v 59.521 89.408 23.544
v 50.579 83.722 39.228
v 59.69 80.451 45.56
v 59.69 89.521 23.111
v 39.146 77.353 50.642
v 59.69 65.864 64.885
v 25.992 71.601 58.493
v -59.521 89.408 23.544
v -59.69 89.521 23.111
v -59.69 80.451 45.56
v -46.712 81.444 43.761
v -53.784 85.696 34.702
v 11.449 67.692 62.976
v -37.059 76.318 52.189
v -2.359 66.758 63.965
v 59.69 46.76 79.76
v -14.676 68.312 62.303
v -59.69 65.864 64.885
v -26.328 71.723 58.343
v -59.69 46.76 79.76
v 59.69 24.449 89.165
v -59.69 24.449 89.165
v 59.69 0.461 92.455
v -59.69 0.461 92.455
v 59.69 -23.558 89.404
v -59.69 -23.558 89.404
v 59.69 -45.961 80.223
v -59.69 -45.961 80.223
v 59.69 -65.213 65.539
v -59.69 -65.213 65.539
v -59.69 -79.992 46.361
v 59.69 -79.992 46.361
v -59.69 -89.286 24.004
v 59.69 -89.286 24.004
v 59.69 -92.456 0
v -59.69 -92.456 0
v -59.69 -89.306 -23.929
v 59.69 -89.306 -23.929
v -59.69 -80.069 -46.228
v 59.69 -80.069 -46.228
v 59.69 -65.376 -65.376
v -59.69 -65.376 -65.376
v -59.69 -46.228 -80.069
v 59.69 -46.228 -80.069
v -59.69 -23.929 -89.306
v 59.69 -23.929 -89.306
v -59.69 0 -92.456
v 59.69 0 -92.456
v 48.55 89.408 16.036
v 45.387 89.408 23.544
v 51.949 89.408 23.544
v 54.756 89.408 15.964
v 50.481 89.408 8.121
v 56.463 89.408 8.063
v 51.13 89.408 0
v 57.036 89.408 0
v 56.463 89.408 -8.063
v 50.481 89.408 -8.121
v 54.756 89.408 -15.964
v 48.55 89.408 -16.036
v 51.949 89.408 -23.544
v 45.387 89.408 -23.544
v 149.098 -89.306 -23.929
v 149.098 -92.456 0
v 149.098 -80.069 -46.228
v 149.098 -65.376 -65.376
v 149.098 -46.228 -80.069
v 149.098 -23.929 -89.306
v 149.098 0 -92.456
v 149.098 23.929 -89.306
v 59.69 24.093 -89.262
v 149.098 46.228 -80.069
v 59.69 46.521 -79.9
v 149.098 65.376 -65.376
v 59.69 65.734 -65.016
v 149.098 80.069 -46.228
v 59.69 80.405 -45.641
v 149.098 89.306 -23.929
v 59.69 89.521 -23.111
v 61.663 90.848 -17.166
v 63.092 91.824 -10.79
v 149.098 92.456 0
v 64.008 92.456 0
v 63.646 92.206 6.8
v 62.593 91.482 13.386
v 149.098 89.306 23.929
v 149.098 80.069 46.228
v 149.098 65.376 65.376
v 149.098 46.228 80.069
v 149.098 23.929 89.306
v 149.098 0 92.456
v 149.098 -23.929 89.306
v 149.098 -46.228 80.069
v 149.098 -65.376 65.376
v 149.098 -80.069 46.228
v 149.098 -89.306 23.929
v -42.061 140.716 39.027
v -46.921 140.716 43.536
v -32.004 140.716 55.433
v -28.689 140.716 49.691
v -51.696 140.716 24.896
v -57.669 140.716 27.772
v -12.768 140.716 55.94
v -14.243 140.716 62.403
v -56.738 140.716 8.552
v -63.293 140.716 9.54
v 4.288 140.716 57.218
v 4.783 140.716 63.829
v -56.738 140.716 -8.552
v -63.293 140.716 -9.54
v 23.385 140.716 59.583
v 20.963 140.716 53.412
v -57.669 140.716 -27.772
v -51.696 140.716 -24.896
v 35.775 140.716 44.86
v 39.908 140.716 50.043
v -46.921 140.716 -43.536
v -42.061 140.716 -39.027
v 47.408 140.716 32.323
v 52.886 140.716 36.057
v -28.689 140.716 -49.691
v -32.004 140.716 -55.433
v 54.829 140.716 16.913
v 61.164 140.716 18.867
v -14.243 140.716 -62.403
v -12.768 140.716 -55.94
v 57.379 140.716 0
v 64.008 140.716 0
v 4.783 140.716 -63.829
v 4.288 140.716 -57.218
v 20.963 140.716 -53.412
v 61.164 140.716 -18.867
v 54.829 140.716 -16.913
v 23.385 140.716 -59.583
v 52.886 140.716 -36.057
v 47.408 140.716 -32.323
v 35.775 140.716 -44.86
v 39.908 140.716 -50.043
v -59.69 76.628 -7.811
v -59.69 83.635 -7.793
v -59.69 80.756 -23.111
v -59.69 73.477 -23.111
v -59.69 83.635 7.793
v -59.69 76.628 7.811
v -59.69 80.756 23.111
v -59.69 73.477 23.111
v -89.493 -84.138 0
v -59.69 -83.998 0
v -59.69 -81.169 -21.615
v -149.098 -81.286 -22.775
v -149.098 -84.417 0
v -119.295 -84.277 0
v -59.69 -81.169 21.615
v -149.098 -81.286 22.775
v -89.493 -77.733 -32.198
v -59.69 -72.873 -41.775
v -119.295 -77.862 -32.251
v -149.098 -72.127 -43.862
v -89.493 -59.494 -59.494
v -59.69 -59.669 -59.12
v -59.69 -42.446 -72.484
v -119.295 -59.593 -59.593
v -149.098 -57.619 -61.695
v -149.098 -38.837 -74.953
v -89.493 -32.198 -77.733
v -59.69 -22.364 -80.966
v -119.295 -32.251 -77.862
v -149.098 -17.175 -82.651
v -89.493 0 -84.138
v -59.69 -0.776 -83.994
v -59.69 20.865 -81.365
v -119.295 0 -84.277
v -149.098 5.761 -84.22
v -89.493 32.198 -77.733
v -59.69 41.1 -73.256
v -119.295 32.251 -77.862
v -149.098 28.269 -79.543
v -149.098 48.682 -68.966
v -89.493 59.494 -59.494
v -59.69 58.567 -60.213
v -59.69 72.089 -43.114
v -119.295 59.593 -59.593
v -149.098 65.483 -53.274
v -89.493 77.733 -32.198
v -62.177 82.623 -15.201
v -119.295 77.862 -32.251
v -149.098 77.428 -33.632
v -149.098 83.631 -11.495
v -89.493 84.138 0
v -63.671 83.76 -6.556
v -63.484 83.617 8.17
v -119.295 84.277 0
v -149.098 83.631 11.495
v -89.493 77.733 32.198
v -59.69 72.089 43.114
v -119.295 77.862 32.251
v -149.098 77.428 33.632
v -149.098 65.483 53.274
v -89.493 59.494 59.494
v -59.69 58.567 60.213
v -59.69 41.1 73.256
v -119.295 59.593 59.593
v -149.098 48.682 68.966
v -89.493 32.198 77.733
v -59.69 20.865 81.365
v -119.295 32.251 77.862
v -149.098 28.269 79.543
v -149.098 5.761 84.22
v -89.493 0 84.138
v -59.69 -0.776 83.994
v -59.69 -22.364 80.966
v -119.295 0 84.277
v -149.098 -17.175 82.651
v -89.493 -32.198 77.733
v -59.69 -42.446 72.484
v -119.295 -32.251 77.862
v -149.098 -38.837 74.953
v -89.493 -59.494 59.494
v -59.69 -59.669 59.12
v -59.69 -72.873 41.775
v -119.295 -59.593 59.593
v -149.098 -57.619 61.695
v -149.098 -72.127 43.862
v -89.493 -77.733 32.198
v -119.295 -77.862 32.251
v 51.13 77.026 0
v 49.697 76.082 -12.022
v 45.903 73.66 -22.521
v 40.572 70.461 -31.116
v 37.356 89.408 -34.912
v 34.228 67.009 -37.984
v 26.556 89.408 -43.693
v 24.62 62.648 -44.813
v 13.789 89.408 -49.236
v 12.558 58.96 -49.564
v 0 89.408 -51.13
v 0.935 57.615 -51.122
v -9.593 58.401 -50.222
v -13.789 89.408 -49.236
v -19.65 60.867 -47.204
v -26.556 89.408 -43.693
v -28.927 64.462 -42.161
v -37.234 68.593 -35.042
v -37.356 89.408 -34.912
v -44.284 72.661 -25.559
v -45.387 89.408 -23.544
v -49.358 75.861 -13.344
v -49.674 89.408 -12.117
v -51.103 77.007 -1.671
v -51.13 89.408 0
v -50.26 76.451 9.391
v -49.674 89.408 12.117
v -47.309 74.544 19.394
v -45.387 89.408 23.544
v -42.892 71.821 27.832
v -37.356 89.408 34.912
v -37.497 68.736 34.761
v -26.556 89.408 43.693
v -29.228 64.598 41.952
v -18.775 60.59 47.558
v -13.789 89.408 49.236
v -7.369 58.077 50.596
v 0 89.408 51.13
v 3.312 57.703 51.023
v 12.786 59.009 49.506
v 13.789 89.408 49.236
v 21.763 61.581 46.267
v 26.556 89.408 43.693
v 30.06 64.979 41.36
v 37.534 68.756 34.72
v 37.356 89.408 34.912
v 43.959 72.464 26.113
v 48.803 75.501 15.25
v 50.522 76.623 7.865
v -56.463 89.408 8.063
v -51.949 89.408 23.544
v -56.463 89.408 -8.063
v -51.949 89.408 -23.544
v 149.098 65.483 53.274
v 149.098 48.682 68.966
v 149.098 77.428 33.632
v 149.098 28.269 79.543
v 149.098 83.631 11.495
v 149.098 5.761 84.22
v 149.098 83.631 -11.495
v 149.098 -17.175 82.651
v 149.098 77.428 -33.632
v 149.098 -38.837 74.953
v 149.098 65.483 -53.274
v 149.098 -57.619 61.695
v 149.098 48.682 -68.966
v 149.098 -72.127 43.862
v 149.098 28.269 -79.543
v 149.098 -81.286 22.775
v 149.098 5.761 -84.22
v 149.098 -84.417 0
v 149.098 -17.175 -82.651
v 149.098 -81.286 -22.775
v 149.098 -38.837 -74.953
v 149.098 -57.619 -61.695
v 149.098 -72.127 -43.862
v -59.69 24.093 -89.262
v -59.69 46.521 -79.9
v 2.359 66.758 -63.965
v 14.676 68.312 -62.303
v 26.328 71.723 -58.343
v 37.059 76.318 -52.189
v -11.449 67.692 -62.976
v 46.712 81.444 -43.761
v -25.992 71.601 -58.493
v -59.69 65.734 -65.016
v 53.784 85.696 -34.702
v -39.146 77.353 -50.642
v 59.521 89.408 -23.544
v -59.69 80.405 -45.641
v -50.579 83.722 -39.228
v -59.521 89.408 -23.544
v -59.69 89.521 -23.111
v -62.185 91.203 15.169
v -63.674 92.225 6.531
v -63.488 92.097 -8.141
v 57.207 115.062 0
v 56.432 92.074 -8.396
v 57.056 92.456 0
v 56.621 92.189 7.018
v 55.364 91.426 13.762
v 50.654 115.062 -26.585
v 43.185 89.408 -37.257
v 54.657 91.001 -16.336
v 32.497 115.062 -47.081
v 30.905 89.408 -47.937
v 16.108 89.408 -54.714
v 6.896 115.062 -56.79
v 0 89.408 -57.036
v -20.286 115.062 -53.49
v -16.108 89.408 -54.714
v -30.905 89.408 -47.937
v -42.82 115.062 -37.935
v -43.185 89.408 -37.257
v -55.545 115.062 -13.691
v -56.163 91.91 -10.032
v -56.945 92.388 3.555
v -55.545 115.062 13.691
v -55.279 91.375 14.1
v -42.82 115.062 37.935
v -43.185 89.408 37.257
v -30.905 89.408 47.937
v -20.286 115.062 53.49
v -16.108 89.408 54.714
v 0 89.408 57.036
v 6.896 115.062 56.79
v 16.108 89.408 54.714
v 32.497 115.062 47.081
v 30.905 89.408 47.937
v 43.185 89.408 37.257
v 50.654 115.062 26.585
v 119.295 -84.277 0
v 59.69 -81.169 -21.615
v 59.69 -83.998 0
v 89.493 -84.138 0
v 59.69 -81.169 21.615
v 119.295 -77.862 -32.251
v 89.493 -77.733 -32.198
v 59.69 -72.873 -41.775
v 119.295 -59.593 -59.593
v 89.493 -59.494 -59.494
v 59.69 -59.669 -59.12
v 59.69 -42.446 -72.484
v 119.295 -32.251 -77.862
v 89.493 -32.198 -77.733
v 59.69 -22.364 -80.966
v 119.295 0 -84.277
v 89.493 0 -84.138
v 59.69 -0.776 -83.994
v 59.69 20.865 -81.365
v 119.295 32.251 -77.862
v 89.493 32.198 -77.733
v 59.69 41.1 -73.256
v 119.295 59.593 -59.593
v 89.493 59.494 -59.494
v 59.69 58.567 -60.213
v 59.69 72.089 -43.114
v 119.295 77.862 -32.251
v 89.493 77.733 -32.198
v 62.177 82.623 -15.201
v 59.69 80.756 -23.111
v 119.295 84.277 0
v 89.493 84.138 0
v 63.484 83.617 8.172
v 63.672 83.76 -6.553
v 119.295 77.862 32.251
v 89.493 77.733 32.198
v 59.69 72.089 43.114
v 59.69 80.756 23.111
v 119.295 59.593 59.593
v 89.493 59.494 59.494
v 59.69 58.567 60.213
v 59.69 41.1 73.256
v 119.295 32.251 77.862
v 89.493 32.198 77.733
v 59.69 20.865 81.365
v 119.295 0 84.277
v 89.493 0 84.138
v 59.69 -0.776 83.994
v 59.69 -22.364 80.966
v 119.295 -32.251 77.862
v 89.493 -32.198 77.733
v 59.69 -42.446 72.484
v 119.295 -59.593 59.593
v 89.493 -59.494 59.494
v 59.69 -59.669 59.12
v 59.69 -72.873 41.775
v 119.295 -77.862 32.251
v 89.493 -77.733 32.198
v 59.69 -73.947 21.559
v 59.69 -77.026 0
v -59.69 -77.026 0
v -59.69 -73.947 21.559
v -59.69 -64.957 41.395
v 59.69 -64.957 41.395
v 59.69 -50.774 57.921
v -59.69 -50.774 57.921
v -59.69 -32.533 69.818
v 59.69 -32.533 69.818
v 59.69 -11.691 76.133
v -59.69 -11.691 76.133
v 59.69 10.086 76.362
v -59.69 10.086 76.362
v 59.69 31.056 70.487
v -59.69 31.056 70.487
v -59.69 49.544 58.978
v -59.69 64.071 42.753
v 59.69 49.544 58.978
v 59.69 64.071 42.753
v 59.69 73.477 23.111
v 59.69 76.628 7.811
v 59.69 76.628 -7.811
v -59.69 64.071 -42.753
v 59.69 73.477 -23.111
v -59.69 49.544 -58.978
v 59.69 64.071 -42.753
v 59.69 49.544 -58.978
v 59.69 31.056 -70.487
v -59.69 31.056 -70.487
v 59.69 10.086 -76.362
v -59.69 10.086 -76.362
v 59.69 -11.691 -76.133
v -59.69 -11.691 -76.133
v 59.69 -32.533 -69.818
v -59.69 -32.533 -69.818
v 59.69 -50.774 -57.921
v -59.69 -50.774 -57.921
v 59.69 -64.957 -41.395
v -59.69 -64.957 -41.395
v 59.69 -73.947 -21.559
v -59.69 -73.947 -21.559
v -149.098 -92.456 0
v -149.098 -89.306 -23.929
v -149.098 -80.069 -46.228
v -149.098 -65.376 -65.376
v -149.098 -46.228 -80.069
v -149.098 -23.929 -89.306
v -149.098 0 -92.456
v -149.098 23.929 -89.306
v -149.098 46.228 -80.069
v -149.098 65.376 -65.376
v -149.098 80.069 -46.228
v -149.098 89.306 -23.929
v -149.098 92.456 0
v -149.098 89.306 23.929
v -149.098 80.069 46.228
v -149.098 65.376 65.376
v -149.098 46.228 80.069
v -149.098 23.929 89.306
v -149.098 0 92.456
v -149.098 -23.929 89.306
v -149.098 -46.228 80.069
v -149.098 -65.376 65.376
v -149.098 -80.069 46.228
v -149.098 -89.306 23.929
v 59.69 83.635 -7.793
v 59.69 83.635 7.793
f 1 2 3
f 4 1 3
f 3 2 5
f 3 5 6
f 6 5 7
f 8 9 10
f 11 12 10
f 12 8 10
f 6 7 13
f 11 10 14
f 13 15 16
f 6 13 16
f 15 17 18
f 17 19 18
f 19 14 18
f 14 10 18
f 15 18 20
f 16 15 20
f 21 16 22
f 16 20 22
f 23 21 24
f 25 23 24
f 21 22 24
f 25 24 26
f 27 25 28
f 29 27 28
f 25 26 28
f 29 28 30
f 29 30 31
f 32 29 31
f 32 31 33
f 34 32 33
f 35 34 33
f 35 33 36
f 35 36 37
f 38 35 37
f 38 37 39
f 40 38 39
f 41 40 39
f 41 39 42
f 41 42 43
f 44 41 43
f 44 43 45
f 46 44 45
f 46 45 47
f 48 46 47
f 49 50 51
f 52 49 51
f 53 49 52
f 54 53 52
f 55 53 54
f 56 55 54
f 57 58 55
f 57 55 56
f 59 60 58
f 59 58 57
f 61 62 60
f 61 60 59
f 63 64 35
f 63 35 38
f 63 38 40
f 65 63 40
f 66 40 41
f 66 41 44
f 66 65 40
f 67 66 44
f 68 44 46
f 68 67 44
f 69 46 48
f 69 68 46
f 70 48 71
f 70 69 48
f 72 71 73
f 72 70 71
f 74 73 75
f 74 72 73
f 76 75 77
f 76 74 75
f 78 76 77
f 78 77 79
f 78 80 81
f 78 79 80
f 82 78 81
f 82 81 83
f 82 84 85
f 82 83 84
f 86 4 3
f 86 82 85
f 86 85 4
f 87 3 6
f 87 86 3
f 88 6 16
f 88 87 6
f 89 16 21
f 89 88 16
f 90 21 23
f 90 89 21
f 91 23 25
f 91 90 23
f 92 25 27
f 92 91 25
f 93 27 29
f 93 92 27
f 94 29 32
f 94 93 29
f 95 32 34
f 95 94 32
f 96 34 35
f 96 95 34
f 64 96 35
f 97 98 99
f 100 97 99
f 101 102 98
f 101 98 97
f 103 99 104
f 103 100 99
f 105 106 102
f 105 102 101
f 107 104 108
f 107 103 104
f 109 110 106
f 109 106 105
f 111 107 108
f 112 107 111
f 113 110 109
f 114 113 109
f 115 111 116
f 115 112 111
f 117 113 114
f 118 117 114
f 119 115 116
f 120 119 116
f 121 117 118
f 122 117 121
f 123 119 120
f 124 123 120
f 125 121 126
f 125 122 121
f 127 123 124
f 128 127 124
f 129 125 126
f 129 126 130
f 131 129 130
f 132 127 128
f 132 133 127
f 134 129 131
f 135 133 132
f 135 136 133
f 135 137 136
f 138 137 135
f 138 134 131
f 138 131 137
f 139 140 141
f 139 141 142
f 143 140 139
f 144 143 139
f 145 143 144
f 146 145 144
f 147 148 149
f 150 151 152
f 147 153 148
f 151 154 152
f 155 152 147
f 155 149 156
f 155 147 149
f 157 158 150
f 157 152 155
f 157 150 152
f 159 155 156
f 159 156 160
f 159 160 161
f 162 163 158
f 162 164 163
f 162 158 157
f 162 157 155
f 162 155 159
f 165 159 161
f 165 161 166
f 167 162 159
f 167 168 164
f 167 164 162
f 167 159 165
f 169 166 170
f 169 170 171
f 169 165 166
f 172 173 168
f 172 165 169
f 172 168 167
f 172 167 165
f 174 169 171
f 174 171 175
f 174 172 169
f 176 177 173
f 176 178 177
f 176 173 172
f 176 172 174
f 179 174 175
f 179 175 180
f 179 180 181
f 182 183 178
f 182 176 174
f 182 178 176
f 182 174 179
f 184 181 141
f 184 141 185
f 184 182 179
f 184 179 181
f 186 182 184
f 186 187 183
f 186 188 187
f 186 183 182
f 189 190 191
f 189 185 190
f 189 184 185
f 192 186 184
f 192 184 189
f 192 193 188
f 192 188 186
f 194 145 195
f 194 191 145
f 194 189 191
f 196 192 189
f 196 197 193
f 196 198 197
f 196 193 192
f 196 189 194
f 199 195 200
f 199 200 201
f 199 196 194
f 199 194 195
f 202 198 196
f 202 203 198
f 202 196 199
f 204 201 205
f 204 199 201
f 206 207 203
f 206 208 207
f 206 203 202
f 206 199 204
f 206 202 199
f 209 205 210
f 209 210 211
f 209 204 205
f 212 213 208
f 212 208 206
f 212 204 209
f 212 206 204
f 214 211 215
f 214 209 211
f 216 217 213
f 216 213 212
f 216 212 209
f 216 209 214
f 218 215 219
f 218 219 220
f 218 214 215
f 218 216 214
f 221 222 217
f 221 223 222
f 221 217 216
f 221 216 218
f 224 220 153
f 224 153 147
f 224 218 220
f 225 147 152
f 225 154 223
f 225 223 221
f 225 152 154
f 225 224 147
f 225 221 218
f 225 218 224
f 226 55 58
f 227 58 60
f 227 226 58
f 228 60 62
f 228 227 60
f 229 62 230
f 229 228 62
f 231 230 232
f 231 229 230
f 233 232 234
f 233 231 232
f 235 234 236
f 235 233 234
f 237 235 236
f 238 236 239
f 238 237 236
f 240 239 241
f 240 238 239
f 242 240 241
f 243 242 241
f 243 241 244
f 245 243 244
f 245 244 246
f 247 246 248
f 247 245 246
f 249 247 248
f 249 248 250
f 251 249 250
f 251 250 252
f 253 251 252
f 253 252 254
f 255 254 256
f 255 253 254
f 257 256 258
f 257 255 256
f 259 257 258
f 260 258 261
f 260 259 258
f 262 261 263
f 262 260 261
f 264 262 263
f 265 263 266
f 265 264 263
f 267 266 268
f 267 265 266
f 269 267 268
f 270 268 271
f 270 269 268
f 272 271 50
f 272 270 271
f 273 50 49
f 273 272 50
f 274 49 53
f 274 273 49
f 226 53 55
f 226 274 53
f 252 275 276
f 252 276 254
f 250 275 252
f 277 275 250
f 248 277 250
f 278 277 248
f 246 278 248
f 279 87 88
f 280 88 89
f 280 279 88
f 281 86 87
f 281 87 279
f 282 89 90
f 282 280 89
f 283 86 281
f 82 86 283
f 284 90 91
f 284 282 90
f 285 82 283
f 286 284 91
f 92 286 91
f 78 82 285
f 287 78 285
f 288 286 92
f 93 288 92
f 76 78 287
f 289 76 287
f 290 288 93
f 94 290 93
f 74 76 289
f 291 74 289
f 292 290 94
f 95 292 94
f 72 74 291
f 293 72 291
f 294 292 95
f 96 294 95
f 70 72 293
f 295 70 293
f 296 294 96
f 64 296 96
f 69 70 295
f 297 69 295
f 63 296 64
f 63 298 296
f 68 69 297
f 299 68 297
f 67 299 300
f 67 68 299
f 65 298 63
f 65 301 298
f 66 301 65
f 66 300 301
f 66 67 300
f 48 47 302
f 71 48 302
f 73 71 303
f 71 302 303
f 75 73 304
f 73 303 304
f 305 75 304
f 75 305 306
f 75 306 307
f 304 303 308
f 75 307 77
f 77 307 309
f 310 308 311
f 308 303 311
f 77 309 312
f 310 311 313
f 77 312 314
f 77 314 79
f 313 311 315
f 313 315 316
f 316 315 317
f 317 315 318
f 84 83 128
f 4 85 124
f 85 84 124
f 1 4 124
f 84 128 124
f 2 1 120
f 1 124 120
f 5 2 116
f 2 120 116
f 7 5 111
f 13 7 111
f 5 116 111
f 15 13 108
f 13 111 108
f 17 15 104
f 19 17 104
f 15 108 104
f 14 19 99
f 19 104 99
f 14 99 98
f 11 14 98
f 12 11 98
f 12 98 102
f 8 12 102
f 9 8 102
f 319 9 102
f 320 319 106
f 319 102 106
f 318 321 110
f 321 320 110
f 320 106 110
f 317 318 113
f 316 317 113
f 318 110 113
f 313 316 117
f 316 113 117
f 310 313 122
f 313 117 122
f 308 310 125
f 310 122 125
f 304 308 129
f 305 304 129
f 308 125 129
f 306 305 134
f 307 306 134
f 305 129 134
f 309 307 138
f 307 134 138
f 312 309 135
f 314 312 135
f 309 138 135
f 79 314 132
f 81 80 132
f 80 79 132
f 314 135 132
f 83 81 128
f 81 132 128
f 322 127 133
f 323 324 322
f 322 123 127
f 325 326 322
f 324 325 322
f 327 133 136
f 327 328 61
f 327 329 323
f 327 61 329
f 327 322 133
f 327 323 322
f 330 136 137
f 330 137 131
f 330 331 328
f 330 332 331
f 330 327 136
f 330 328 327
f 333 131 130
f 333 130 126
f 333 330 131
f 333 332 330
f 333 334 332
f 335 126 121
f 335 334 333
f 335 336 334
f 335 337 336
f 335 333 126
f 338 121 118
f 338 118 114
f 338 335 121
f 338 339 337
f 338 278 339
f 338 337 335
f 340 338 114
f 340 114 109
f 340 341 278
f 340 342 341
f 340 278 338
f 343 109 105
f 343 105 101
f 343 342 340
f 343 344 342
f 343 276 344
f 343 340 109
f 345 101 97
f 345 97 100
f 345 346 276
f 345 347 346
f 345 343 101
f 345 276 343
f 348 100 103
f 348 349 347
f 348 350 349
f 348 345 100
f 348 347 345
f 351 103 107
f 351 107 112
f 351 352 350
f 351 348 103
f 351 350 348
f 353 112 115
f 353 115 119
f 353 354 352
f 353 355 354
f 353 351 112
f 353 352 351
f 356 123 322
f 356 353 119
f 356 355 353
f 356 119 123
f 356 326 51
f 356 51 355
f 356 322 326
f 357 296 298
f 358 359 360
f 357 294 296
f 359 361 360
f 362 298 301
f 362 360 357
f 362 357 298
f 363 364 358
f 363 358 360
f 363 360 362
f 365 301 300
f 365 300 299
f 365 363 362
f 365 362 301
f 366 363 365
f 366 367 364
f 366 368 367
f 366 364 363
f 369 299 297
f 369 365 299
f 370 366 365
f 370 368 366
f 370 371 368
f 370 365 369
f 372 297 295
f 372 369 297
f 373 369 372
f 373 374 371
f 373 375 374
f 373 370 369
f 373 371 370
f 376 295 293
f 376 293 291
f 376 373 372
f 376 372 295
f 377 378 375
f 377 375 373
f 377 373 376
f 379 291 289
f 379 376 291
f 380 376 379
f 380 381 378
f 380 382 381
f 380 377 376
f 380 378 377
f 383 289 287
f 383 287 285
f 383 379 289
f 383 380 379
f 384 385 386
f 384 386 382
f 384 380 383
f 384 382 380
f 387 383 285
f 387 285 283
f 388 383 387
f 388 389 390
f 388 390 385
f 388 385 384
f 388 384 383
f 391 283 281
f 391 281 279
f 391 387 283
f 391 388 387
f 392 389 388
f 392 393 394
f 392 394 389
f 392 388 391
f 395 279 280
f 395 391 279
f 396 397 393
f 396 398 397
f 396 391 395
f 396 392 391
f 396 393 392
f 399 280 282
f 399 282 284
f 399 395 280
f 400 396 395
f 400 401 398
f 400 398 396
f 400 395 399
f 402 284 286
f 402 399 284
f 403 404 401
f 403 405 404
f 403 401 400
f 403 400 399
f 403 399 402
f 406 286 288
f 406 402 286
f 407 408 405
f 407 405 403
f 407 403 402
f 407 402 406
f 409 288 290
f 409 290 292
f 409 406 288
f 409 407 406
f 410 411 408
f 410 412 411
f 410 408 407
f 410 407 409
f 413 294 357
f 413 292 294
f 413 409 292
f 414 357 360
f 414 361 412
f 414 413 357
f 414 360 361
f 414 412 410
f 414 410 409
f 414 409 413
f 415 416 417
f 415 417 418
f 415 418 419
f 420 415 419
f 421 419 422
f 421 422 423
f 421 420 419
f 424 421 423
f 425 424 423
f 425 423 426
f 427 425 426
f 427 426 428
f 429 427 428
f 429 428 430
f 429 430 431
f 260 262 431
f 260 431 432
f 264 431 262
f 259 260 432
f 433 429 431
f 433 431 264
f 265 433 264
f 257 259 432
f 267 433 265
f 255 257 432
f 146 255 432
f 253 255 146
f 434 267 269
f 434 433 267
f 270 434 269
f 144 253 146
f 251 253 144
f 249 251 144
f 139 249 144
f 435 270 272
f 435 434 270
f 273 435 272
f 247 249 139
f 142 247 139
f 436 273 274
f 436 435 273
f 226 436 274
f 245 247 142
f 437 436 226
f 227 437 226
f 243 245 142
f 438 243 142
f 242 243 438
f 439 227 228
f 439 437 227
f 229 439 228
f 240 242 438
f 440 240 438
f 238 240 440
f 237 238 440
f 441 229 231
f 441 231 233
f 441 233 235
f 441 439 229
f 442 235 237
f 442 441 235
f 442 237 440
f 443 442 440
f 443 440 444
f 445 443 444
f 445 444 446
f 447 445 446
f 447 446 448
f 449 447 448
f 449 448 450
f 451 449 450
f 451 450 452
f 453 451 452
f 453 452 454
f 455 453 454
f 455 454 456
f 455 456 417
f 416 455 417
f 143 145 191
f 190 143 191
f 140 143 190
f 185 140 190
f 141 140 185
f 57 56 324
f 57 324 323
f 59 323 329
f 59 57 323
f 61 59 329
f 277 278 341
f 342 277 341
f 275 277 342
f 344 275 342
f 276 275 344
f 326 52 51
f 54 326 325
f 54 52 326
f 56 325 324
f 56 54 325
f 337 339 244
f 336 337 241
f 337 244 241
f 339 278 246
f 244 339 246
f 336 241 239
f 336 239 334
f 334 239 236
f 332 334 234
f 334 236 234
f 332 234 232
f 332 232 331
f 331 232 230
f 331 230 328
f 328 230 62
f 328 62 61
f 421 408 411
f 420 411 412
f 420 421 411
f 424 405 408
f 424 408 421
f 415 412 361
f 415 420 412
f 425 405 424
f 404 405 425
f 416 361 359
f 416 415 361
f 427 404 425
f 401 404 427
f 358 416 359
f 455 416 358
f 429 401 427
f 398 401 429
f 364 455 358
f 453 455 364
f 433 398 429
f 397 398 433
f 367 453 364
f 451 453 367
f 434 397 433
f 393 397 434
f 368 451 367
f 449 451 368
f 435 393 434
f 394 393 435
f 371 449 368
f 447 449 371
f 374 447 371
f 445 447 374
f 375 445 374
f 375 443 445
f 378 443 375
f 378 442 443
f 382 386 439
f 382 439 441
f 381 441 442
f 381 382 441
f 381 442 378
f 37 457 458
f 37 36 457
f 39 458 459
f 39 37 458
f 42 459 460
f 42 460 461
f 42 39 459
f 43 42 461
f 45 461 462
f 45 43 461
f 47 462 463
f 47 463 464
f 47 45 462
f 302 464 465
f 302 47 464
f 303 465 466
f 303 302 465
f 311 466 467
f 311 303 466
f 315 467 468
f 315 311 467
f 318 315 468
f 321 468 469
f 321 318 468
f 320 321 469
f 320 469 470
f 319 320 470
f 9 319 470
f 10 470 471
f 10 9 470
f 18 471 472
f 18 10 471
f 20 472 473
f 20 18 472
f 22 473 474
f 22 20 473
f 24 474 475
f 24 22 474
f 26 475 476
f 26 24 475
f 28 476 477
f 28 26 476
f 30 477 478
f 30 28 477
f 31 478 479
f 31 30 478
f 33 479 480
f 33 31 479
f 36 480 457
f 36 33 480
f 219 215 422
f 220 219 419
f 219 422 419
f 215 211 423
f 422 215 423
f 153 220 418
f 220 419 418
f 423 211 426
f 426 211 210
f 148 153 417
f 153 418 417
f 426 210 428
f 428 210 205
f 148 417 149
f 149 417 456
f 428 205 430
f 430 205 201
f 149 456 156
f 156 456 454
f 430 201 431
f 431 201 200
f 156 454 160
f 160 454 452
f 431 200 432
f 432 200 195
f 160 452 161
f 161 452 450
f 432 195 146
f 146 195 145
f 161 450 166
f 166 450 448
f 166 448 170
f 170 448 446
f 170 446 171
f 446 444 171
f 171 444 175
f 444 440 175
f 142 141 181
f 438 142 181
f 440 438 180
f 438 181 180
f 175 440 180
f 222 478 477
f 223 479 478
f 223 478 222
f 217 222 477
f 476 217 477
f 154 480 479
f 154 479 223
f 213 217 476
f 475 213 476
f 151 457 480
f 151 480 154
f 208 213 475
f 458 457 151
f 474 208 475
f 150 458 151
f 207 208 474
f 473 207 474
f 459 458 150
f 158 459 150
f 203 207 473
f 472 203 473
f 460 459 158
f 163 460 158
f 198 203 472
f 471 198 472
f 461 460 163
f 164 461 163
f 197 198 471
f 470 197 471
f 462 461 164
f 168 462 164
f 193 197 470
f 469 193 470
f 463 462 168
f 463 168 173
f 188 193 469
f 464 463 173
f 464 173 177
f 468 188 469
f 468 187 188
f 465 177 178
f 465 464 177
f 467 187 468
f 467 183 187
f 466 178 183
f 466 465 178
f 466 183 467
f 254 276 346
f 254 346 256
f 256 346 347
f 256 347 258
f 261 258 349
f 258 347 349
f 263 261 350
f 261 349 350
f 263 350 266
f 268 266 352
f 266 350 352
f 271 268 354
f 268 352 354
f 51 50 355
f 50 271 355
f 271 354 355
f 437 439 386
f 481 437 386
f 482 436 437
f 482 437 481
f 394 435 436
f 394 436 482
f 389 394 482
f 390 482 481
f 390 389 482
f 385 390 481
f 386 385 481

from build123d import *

# Parameters (mm, degrees)
SKETCH4_R           = 92.456
BOSS_EXTRUDE1_DEPTH = 119.38
SKETCH5_R           = 64.008
BOSS_EXTRUDE2_DEPTH = 89.408


with BuildPart() as part:
    # Sketch1 → Revolve1 (revolve)
    with BuildSketch(Plane.XY):
        Polygon((-149.098, -92.456), (-59.69, -92.456), (-59.69, -83.9978), (-149.098, -84.4169), align=None)
        Polygon((149.098, -84.4169), (59.69, -83.9978), (59.69, -92.456), (149.098, -92.456), align=None)
    revolve(axis=Axis((-149.098, 0, 0), (1, 0, 0)))



with BuildPart() as body_2:
    # Sketch2 → Revolve2 (revolve)
    with BuildSketch(Plane.XY):
        Polygon((57.3786, 140.716), (57.0357, 89.408), (64.008, 89.408), (64.008, 140.716), align=None)
    revolve(axis=Axis((0, 0, 0), (0, 1, 0)))


with BuildPart() as part_1:
    add(part.part)

    add(body_2.part)  # Boss-Extrude1 merges body 2
    # Sketch4 → Boss-Extrude1 (add)
    with BuildSketch(Plane(origin=(-59.69, 0, 0), x_dir=(0, 0, -1), z_dir=(1, 0, 0))):
        Circle(SKETCH4_R)
    extrude(amount=BOSS_EXTRUDE1_DEPTH)

    # Sketch5 → Boss-Extrude2 (add)
    with BuildSketch(Plane.XZ.offset(-89.408)):
        Circle(SKETCH5_R)
    extrude(amount=BOSS_EXTRUDE2_DEPTH)

    # Sketch6 → Cut-Revolve1 (revolve, cut)
    with BuildSketch(Plane.XY):
        Polygon((-149.098, -84.4169), (-59.69, -83.9978), (-59.69, -77.0255), (59.69, -77.0255), (59.69, -83.9978), (149.098, -84.4169), (149.098, 0), (-149.098, 0), align=None)
    revolve(axis=Axis((149.098, 0, 0), (-1, 0, 0)), mode=Mode.SUBTRACT)

    # Sketch7 → Cut-Revolve2 (revolve, cut)
    with BuildSketch(Plane.XY):
        Polygon((57.3786, 140.716), (57.0357, 89.408), (51.1302, 89.408), (51.1302, 0), (0, 0), (0, 140.716), align=None)
    revolve(axis=Axis((0, 0, 0), (0, 1, 0)), mode=Mode.SUBTRACT)


solid = part_1.part
